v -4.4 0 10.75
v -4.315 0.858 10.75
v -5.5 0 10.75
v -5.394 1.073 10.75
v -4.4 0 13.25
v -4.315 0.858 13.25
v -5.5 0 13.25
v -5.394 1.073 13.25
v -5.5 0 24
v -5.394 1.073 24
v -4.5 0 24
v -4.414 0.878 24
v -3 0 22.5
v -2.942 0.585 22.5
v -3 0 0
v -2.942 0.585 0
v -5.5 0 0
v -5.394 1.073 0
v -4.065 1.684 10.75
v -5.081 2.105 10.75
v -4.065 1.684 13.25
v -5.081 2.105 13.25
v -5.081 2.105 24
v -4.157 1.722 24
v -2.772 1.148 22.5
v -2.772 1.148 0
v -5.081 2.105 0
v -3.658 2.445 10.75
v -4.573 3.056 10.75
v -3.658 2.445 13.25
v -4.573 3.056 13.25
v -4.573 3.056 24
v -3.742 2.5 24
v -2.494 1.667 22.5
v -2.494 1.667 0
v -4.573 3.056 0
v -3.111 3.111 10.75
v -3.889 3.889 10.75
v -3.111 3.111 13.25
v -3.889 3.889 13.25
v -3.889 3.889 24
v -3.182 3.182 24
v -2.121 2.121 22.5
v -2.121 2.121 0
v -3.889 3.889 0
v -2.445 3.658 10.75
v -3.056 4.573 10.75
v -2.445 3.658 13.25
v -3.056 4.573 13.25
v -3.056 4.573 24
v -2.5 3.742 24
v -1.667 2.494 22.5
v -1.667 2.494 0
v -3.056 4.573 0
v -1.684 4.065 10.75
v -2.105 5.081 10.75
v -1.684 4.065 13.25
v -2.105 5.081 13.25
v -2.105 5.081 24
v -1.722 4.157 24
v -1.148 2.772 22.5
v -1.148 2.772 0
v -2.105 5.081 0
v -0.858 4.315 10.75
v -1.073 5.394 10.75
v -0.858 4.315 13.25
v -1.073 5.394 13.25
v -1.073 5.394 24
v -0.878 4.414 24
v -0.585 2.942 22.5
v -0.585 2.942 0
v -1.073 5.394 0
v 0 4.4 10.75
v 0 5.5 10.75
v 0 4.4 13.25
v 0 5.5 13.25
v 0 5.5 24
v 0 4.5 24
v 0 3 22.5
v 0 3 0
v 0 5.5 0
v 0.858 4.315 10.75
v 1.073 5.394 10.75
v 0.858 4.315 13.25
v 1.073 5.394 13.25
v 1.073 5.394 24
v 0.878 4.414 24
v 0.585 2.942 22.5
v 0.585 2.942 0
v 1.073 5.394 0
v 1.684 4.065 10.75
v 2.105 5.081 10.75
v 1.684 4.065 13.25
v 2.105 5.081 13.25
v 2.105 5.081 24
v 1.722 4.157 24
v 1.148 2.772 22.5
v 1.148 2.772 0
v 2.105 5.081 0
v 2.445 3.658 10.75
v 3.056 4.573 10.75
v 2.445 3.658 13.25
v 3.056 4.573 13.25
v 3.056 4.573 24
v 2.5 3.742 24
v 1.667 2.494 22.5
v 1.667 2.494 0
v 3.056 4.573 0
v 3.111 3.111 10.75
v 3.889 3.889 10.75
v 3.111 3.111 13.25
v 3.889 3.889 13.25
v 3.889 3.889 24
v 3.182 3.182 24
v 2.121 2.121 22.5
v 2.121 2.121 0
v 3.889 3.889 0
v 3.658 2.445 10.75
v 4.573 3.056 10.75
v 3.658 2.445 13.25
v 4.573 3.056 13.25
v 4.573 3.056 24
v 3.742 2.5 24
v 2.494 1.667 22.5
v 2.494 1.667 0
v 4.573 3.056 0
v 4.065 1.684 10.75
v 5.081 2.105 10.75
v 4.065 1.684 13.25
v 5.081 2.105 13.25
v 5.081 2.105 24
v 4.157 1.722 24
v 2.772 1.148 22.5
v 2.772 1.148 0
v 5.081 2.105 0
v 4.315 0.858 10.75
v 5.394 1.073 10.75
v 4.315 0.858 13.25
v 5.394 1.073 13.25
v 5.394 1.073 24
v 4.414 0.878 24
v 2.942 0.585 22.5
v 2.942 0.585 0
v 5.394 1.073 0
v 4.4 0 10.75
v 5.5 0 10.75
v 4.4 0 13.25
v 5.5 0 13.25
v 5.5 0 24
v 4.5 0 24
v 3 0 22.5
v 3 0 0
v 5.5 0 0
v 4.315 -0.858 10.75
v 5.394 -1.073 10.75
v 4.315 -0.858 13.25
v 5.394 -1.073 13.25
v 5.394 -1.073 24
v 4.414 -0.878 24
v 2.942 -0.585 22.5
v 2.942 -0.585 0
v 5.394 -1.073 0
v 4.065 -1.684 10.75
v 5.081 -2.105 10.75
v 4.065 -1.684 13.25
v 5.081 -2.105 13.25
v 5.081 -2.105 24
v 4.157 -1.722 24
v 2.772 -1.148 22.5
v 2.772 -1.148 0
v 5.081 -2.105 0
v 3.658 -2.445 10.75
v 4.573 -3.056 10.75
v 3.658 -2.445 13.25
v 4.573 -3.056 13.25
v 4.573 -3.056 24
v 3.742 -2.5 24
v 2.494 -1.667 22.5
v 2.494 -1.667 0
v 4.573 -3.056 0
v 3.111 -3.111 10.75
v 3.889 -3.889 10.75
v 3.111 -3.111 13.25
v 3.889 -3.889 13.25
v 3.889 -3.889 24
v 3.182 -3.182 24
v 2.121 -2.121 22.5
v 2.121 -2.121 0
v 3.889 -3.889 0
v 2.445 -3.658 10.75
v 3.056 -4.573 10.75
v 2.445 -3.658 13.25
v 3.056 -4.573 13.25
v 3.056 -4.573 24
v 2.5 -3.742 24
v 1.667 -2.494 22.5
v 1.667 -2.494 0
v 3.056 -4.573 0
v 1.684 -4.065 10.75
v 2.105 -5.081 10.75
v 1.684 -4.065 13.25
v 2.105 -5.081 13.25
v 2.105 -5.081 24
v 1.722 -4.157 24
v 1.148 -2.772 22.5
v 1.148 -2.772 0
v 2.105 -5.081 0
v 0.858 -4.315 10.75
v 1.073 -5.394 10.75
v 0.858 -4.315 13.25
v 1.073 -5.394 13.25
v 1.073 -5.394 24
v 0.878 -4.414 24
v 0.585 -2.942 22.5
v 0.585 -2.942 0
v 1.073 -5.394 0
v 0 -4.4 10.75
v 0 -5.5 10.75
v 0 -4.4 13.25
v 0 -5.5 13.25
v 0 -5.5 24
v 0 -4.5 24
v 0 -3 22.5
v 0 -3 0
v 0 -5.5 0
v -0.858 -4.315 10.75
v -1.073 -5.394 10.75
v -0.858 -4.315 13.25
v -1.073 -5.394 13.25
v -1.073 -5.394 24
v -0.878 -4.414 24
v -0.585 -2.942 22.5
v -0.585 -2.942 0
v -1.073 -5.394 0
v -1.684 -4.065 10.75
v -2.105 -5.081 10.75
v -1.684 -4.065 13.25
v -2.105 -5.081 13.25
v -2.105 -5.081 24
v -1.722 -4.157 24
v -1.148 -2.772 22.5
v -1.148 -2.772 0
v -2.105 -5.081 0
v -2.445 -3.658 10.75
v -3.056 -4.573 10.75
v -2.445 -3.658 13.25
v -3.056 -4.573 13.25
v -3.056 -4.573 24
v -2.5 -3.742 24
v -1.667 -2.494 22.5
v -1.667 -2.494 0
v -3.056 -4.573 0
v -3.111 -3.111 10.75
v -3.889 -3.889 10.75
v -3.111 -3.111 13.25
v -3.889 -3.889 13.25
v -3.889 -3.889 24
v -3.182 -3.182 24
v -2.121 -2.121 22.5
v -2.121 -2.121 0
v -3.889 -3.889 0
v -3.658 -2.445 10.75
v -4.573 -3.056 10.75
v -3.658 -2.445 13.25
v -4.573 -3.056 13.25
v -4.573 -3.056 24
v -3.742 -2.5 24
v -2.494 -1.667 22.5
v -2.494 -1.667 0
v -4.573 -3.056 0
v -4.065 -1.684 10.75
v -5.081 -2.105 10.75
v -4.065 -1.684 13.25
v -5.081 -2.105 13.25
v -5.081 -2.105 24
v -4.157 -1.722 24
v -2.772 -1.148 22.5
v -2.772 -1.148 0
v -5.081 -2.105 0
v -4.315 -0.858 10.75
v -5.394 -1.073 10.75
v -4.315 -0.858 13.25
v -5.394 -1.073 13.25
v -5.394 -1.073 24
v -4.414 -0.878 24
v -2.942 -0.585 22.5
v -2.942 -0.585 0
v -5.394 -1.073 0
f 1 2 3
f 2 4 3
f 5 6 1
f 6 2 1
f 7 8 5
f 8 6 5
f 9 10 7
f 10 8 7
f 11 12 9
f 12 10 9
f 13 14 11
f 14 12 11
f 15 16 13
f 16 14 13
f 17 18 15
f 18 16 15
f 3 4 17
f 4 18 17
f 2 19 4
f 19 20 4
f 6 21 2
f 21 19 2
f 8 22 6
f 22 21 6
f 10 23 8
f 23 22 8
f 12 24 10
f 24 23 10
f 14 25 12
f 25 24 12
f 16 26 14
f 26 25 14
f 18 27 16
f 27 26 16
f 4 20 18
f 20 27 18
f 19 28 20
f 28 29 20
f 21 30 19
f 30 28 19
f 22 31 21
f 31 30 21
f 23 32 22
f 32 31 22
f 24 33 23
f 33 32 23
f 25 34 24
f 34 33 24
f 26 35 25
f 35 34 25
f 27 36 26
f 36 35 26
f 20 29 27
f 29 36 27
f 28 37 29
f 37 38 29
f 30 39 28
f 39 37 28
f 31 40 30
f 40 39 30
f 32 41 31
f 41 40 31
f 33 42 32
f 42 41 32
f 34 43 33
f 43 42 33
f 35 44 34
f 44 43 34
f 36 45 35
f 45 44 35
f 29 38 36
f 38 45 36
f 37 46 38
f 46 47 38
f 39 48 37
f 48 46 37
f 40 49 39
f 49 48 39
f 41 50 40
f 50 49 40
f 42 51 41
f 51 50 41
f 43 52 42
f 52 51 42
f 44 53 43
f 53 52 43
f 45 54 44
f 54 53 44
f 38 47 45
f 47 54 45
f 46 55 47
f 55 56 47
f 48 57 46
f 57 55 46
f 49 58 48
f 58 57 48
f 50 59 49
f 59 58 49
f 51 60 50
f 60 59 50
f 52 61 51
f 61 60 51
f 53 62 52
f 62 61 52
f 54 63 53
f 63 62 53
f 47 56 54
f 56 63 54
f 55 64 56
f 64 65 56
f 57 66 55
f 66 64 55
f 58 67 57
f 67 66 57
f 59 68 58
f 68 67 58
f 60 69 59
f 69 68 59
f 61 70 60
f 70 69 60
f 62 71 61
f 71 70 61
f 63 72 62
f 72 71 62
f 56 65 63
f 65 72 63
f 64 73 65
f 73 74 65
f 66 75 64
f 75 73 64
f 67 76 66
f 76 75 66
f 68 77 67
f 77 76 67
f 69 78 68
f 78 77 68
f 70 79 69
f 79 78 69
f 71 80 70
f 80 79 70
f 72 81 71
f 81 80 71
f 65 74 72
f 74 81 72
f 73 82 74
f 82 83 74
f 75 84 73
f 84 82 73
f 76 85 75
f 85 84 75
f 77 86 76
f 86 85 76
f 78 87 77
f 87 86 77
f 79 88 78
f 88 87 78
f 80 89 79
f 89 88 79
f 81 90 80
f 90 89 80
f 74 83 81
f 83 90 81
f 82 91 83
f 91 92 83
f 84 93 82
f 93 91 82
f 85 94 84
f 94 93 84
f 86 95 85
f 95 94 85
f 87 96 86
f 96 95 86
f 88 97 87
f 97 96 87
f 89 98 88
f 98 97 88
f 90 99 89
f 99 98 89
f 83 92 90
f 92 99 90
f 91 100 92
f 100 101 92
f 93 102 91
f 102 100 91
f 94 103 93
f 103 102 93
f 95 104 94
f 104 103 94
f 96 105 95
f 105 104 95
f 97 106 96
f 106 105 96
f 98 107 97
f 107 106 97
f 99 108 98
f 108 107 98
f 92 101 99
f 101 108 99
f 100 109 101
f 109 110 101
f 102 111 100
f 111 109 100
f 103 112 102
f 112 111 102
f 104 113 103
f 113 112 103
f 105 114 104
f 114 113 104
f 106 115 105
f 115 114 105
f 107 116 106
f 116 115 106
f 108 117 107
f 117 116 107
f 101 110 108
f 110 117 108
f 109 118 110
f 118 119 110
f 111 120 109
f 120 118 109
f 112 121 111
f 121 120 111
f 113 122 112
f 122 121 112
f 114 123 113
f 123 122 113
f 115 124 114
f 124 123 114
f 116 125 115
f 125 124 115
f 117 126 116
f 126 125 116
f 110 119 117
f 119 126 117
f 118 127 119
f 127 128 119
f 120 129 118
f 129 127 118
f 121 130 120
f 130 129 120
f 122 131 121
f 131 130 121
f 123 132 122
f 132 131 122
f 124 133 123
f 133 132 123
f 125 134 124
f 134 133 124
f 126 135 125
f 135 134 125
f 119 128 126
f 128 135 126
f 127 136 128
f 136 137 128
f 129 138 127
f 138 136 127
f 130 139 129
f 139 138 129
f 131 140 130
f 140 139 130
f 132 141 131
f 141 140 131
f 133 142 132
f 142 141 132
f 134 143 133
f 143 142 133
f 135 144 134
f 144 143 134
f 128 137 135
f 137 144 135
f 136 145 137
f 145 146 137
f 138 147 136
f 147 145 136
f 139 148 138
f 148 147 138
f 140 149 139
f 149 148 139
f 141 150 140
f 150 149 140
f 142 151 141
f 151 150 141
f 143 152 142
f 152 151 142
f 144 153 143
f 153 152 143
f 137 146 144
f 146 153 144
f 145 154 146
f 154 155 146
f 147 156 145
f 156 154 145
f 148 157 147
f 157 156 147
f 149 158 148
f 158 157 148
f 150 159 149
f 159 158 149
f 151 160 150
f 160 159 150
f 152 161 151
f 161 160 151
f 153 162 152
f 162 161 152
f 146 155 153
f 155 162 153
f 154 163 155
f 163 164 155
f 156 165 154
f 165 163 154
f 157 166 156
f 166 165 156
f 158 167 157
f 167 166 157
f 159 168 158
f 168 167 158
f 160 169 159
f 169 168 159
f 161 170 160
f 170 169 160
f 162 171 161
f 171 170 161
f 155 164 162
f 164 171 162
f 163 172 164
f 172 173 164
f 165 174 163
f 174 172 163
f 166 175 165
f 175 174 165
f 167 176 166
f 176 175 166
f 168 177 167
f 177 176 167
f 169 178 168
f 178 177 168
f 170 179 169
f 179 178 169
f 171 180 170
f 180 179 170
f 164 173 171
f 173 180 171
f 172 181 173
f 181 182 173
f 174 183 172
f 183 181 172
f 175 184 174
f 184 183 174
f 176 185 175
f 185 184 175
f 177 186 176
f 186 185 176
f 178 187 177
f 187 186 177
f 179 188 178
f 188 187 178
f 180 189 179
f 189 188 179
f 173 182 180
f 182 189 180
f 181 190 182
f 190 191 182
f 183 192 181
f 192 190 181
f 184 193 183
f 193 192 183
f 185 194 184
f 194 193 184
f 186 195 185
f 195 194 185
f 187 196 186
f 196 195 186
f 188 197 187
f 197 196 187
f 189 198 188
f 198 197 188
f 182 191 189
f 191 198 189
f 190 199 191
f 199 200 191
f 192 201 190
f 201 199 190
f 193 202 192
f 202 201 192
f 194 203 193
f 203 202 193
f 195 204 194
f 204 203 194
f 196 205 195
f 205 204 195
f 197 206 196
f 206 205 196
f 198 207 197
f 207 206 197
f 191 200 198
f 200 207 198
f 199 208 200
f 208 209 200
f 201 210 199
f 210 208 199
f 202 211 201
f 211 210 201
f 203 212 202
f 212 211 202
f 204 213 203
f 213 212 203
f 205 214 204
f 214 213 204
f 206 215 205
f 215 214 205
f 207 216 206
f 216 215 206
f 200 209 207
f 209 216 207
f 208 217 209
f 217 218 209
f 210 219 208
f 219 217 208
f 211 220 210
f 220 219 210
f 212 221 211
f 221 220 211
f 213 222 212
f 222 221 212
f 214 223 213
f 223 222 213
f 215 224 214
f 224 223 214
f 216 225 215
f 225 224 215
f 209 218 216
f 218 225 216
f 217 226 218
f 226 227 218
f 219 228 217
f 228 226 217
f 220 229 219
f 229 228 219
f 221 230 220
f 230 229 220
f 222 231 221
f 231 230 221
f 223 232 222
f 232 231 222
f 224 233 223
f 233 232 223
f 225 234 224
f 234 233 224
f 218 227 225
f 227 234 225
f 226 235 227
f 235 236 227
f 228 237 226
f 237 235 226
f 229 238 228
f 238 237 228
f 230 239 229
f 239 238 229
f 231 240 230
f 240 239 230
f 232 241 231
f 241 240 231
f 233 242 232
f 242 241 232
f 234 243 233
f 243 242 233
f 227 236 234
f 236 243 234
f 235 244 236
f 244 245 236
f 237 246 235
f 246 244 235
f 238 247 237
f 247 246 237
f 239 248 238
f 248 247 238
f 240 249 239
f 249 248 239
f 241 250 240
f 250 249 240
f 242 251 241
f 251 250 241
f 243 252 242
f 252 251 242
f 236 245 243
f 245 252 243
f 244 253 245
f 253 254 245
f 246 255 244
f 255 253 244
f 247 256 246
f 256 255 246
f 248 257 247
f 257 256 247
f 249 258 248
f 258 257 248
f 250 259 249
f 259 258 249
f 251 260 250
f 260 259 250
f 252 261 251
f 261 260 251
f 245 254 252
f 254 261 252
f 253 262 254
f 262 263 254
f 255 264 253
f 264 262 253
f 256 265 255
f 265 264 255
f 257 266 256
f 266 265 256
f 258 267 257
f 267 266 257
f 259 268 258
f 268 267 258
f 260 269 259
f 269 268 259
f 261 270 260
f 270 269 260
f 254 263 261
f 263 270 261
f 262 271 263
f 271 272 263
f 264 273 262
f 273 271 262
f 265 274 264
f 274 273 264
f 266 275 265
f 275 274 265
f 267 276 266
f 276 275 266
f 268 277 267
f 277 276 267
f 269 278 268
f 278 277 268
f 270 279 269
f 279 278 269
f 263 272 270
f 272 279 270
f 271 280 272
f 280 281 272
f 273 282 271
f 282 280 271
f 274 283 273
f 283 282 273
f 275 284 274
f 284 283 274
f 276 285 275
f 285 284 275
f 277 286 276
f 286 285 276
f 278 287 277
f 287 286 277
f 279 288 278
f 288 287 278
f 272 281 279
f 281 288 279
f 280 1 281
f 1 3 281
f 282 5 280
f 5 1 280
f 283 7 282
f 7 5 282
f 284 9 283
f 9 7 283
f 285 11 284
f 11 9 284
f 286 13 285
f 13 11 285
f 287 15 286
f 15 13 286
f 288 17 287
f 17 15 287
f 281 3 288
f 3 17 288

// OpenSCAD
$fn = 32;

// ----------------------------------------------------------------------
// Grooved revolve: thread_relief, bore R3
// ----------------------------------------------------------------------

// --- parameters (mm) ---
bore_r = 3;               // bore radius
outer_r = 5.5;            // outer radius of the body
total_h = 24;             // overall height, Z
wall = 2.5;               // radial wall thickness
groove_w = 2.5;           // groove width
groove_d = 1.1;           // groove depth
grooves = 1;              // number of outer grooves
relief = 1.5;             // thread relief leg at the bore mouth
relief_angle = 45;        // thread relief chamfer angle, degrees

bbox_x = 2 * outer_r;  // full diameter
bore_d = 2 * bore_r;  // bore diameter
body_d = 2 * outer_r;  // body diameter
revolve_angle = 360;  // full turn around the Z axis

profile = [[3, 0], [5.5, 0], [5.5, 10.75], [4.4, 10.75], [4.4, 13.25], [5.5, 13.25], [5.5, 24], [4.5, 24], [3, 22.5]];  // primary outline, 9 points, counter clockwise

// --- the one profile operation ---
rotate_extrude(angle = revolve_angle) polygon(points = profile);
